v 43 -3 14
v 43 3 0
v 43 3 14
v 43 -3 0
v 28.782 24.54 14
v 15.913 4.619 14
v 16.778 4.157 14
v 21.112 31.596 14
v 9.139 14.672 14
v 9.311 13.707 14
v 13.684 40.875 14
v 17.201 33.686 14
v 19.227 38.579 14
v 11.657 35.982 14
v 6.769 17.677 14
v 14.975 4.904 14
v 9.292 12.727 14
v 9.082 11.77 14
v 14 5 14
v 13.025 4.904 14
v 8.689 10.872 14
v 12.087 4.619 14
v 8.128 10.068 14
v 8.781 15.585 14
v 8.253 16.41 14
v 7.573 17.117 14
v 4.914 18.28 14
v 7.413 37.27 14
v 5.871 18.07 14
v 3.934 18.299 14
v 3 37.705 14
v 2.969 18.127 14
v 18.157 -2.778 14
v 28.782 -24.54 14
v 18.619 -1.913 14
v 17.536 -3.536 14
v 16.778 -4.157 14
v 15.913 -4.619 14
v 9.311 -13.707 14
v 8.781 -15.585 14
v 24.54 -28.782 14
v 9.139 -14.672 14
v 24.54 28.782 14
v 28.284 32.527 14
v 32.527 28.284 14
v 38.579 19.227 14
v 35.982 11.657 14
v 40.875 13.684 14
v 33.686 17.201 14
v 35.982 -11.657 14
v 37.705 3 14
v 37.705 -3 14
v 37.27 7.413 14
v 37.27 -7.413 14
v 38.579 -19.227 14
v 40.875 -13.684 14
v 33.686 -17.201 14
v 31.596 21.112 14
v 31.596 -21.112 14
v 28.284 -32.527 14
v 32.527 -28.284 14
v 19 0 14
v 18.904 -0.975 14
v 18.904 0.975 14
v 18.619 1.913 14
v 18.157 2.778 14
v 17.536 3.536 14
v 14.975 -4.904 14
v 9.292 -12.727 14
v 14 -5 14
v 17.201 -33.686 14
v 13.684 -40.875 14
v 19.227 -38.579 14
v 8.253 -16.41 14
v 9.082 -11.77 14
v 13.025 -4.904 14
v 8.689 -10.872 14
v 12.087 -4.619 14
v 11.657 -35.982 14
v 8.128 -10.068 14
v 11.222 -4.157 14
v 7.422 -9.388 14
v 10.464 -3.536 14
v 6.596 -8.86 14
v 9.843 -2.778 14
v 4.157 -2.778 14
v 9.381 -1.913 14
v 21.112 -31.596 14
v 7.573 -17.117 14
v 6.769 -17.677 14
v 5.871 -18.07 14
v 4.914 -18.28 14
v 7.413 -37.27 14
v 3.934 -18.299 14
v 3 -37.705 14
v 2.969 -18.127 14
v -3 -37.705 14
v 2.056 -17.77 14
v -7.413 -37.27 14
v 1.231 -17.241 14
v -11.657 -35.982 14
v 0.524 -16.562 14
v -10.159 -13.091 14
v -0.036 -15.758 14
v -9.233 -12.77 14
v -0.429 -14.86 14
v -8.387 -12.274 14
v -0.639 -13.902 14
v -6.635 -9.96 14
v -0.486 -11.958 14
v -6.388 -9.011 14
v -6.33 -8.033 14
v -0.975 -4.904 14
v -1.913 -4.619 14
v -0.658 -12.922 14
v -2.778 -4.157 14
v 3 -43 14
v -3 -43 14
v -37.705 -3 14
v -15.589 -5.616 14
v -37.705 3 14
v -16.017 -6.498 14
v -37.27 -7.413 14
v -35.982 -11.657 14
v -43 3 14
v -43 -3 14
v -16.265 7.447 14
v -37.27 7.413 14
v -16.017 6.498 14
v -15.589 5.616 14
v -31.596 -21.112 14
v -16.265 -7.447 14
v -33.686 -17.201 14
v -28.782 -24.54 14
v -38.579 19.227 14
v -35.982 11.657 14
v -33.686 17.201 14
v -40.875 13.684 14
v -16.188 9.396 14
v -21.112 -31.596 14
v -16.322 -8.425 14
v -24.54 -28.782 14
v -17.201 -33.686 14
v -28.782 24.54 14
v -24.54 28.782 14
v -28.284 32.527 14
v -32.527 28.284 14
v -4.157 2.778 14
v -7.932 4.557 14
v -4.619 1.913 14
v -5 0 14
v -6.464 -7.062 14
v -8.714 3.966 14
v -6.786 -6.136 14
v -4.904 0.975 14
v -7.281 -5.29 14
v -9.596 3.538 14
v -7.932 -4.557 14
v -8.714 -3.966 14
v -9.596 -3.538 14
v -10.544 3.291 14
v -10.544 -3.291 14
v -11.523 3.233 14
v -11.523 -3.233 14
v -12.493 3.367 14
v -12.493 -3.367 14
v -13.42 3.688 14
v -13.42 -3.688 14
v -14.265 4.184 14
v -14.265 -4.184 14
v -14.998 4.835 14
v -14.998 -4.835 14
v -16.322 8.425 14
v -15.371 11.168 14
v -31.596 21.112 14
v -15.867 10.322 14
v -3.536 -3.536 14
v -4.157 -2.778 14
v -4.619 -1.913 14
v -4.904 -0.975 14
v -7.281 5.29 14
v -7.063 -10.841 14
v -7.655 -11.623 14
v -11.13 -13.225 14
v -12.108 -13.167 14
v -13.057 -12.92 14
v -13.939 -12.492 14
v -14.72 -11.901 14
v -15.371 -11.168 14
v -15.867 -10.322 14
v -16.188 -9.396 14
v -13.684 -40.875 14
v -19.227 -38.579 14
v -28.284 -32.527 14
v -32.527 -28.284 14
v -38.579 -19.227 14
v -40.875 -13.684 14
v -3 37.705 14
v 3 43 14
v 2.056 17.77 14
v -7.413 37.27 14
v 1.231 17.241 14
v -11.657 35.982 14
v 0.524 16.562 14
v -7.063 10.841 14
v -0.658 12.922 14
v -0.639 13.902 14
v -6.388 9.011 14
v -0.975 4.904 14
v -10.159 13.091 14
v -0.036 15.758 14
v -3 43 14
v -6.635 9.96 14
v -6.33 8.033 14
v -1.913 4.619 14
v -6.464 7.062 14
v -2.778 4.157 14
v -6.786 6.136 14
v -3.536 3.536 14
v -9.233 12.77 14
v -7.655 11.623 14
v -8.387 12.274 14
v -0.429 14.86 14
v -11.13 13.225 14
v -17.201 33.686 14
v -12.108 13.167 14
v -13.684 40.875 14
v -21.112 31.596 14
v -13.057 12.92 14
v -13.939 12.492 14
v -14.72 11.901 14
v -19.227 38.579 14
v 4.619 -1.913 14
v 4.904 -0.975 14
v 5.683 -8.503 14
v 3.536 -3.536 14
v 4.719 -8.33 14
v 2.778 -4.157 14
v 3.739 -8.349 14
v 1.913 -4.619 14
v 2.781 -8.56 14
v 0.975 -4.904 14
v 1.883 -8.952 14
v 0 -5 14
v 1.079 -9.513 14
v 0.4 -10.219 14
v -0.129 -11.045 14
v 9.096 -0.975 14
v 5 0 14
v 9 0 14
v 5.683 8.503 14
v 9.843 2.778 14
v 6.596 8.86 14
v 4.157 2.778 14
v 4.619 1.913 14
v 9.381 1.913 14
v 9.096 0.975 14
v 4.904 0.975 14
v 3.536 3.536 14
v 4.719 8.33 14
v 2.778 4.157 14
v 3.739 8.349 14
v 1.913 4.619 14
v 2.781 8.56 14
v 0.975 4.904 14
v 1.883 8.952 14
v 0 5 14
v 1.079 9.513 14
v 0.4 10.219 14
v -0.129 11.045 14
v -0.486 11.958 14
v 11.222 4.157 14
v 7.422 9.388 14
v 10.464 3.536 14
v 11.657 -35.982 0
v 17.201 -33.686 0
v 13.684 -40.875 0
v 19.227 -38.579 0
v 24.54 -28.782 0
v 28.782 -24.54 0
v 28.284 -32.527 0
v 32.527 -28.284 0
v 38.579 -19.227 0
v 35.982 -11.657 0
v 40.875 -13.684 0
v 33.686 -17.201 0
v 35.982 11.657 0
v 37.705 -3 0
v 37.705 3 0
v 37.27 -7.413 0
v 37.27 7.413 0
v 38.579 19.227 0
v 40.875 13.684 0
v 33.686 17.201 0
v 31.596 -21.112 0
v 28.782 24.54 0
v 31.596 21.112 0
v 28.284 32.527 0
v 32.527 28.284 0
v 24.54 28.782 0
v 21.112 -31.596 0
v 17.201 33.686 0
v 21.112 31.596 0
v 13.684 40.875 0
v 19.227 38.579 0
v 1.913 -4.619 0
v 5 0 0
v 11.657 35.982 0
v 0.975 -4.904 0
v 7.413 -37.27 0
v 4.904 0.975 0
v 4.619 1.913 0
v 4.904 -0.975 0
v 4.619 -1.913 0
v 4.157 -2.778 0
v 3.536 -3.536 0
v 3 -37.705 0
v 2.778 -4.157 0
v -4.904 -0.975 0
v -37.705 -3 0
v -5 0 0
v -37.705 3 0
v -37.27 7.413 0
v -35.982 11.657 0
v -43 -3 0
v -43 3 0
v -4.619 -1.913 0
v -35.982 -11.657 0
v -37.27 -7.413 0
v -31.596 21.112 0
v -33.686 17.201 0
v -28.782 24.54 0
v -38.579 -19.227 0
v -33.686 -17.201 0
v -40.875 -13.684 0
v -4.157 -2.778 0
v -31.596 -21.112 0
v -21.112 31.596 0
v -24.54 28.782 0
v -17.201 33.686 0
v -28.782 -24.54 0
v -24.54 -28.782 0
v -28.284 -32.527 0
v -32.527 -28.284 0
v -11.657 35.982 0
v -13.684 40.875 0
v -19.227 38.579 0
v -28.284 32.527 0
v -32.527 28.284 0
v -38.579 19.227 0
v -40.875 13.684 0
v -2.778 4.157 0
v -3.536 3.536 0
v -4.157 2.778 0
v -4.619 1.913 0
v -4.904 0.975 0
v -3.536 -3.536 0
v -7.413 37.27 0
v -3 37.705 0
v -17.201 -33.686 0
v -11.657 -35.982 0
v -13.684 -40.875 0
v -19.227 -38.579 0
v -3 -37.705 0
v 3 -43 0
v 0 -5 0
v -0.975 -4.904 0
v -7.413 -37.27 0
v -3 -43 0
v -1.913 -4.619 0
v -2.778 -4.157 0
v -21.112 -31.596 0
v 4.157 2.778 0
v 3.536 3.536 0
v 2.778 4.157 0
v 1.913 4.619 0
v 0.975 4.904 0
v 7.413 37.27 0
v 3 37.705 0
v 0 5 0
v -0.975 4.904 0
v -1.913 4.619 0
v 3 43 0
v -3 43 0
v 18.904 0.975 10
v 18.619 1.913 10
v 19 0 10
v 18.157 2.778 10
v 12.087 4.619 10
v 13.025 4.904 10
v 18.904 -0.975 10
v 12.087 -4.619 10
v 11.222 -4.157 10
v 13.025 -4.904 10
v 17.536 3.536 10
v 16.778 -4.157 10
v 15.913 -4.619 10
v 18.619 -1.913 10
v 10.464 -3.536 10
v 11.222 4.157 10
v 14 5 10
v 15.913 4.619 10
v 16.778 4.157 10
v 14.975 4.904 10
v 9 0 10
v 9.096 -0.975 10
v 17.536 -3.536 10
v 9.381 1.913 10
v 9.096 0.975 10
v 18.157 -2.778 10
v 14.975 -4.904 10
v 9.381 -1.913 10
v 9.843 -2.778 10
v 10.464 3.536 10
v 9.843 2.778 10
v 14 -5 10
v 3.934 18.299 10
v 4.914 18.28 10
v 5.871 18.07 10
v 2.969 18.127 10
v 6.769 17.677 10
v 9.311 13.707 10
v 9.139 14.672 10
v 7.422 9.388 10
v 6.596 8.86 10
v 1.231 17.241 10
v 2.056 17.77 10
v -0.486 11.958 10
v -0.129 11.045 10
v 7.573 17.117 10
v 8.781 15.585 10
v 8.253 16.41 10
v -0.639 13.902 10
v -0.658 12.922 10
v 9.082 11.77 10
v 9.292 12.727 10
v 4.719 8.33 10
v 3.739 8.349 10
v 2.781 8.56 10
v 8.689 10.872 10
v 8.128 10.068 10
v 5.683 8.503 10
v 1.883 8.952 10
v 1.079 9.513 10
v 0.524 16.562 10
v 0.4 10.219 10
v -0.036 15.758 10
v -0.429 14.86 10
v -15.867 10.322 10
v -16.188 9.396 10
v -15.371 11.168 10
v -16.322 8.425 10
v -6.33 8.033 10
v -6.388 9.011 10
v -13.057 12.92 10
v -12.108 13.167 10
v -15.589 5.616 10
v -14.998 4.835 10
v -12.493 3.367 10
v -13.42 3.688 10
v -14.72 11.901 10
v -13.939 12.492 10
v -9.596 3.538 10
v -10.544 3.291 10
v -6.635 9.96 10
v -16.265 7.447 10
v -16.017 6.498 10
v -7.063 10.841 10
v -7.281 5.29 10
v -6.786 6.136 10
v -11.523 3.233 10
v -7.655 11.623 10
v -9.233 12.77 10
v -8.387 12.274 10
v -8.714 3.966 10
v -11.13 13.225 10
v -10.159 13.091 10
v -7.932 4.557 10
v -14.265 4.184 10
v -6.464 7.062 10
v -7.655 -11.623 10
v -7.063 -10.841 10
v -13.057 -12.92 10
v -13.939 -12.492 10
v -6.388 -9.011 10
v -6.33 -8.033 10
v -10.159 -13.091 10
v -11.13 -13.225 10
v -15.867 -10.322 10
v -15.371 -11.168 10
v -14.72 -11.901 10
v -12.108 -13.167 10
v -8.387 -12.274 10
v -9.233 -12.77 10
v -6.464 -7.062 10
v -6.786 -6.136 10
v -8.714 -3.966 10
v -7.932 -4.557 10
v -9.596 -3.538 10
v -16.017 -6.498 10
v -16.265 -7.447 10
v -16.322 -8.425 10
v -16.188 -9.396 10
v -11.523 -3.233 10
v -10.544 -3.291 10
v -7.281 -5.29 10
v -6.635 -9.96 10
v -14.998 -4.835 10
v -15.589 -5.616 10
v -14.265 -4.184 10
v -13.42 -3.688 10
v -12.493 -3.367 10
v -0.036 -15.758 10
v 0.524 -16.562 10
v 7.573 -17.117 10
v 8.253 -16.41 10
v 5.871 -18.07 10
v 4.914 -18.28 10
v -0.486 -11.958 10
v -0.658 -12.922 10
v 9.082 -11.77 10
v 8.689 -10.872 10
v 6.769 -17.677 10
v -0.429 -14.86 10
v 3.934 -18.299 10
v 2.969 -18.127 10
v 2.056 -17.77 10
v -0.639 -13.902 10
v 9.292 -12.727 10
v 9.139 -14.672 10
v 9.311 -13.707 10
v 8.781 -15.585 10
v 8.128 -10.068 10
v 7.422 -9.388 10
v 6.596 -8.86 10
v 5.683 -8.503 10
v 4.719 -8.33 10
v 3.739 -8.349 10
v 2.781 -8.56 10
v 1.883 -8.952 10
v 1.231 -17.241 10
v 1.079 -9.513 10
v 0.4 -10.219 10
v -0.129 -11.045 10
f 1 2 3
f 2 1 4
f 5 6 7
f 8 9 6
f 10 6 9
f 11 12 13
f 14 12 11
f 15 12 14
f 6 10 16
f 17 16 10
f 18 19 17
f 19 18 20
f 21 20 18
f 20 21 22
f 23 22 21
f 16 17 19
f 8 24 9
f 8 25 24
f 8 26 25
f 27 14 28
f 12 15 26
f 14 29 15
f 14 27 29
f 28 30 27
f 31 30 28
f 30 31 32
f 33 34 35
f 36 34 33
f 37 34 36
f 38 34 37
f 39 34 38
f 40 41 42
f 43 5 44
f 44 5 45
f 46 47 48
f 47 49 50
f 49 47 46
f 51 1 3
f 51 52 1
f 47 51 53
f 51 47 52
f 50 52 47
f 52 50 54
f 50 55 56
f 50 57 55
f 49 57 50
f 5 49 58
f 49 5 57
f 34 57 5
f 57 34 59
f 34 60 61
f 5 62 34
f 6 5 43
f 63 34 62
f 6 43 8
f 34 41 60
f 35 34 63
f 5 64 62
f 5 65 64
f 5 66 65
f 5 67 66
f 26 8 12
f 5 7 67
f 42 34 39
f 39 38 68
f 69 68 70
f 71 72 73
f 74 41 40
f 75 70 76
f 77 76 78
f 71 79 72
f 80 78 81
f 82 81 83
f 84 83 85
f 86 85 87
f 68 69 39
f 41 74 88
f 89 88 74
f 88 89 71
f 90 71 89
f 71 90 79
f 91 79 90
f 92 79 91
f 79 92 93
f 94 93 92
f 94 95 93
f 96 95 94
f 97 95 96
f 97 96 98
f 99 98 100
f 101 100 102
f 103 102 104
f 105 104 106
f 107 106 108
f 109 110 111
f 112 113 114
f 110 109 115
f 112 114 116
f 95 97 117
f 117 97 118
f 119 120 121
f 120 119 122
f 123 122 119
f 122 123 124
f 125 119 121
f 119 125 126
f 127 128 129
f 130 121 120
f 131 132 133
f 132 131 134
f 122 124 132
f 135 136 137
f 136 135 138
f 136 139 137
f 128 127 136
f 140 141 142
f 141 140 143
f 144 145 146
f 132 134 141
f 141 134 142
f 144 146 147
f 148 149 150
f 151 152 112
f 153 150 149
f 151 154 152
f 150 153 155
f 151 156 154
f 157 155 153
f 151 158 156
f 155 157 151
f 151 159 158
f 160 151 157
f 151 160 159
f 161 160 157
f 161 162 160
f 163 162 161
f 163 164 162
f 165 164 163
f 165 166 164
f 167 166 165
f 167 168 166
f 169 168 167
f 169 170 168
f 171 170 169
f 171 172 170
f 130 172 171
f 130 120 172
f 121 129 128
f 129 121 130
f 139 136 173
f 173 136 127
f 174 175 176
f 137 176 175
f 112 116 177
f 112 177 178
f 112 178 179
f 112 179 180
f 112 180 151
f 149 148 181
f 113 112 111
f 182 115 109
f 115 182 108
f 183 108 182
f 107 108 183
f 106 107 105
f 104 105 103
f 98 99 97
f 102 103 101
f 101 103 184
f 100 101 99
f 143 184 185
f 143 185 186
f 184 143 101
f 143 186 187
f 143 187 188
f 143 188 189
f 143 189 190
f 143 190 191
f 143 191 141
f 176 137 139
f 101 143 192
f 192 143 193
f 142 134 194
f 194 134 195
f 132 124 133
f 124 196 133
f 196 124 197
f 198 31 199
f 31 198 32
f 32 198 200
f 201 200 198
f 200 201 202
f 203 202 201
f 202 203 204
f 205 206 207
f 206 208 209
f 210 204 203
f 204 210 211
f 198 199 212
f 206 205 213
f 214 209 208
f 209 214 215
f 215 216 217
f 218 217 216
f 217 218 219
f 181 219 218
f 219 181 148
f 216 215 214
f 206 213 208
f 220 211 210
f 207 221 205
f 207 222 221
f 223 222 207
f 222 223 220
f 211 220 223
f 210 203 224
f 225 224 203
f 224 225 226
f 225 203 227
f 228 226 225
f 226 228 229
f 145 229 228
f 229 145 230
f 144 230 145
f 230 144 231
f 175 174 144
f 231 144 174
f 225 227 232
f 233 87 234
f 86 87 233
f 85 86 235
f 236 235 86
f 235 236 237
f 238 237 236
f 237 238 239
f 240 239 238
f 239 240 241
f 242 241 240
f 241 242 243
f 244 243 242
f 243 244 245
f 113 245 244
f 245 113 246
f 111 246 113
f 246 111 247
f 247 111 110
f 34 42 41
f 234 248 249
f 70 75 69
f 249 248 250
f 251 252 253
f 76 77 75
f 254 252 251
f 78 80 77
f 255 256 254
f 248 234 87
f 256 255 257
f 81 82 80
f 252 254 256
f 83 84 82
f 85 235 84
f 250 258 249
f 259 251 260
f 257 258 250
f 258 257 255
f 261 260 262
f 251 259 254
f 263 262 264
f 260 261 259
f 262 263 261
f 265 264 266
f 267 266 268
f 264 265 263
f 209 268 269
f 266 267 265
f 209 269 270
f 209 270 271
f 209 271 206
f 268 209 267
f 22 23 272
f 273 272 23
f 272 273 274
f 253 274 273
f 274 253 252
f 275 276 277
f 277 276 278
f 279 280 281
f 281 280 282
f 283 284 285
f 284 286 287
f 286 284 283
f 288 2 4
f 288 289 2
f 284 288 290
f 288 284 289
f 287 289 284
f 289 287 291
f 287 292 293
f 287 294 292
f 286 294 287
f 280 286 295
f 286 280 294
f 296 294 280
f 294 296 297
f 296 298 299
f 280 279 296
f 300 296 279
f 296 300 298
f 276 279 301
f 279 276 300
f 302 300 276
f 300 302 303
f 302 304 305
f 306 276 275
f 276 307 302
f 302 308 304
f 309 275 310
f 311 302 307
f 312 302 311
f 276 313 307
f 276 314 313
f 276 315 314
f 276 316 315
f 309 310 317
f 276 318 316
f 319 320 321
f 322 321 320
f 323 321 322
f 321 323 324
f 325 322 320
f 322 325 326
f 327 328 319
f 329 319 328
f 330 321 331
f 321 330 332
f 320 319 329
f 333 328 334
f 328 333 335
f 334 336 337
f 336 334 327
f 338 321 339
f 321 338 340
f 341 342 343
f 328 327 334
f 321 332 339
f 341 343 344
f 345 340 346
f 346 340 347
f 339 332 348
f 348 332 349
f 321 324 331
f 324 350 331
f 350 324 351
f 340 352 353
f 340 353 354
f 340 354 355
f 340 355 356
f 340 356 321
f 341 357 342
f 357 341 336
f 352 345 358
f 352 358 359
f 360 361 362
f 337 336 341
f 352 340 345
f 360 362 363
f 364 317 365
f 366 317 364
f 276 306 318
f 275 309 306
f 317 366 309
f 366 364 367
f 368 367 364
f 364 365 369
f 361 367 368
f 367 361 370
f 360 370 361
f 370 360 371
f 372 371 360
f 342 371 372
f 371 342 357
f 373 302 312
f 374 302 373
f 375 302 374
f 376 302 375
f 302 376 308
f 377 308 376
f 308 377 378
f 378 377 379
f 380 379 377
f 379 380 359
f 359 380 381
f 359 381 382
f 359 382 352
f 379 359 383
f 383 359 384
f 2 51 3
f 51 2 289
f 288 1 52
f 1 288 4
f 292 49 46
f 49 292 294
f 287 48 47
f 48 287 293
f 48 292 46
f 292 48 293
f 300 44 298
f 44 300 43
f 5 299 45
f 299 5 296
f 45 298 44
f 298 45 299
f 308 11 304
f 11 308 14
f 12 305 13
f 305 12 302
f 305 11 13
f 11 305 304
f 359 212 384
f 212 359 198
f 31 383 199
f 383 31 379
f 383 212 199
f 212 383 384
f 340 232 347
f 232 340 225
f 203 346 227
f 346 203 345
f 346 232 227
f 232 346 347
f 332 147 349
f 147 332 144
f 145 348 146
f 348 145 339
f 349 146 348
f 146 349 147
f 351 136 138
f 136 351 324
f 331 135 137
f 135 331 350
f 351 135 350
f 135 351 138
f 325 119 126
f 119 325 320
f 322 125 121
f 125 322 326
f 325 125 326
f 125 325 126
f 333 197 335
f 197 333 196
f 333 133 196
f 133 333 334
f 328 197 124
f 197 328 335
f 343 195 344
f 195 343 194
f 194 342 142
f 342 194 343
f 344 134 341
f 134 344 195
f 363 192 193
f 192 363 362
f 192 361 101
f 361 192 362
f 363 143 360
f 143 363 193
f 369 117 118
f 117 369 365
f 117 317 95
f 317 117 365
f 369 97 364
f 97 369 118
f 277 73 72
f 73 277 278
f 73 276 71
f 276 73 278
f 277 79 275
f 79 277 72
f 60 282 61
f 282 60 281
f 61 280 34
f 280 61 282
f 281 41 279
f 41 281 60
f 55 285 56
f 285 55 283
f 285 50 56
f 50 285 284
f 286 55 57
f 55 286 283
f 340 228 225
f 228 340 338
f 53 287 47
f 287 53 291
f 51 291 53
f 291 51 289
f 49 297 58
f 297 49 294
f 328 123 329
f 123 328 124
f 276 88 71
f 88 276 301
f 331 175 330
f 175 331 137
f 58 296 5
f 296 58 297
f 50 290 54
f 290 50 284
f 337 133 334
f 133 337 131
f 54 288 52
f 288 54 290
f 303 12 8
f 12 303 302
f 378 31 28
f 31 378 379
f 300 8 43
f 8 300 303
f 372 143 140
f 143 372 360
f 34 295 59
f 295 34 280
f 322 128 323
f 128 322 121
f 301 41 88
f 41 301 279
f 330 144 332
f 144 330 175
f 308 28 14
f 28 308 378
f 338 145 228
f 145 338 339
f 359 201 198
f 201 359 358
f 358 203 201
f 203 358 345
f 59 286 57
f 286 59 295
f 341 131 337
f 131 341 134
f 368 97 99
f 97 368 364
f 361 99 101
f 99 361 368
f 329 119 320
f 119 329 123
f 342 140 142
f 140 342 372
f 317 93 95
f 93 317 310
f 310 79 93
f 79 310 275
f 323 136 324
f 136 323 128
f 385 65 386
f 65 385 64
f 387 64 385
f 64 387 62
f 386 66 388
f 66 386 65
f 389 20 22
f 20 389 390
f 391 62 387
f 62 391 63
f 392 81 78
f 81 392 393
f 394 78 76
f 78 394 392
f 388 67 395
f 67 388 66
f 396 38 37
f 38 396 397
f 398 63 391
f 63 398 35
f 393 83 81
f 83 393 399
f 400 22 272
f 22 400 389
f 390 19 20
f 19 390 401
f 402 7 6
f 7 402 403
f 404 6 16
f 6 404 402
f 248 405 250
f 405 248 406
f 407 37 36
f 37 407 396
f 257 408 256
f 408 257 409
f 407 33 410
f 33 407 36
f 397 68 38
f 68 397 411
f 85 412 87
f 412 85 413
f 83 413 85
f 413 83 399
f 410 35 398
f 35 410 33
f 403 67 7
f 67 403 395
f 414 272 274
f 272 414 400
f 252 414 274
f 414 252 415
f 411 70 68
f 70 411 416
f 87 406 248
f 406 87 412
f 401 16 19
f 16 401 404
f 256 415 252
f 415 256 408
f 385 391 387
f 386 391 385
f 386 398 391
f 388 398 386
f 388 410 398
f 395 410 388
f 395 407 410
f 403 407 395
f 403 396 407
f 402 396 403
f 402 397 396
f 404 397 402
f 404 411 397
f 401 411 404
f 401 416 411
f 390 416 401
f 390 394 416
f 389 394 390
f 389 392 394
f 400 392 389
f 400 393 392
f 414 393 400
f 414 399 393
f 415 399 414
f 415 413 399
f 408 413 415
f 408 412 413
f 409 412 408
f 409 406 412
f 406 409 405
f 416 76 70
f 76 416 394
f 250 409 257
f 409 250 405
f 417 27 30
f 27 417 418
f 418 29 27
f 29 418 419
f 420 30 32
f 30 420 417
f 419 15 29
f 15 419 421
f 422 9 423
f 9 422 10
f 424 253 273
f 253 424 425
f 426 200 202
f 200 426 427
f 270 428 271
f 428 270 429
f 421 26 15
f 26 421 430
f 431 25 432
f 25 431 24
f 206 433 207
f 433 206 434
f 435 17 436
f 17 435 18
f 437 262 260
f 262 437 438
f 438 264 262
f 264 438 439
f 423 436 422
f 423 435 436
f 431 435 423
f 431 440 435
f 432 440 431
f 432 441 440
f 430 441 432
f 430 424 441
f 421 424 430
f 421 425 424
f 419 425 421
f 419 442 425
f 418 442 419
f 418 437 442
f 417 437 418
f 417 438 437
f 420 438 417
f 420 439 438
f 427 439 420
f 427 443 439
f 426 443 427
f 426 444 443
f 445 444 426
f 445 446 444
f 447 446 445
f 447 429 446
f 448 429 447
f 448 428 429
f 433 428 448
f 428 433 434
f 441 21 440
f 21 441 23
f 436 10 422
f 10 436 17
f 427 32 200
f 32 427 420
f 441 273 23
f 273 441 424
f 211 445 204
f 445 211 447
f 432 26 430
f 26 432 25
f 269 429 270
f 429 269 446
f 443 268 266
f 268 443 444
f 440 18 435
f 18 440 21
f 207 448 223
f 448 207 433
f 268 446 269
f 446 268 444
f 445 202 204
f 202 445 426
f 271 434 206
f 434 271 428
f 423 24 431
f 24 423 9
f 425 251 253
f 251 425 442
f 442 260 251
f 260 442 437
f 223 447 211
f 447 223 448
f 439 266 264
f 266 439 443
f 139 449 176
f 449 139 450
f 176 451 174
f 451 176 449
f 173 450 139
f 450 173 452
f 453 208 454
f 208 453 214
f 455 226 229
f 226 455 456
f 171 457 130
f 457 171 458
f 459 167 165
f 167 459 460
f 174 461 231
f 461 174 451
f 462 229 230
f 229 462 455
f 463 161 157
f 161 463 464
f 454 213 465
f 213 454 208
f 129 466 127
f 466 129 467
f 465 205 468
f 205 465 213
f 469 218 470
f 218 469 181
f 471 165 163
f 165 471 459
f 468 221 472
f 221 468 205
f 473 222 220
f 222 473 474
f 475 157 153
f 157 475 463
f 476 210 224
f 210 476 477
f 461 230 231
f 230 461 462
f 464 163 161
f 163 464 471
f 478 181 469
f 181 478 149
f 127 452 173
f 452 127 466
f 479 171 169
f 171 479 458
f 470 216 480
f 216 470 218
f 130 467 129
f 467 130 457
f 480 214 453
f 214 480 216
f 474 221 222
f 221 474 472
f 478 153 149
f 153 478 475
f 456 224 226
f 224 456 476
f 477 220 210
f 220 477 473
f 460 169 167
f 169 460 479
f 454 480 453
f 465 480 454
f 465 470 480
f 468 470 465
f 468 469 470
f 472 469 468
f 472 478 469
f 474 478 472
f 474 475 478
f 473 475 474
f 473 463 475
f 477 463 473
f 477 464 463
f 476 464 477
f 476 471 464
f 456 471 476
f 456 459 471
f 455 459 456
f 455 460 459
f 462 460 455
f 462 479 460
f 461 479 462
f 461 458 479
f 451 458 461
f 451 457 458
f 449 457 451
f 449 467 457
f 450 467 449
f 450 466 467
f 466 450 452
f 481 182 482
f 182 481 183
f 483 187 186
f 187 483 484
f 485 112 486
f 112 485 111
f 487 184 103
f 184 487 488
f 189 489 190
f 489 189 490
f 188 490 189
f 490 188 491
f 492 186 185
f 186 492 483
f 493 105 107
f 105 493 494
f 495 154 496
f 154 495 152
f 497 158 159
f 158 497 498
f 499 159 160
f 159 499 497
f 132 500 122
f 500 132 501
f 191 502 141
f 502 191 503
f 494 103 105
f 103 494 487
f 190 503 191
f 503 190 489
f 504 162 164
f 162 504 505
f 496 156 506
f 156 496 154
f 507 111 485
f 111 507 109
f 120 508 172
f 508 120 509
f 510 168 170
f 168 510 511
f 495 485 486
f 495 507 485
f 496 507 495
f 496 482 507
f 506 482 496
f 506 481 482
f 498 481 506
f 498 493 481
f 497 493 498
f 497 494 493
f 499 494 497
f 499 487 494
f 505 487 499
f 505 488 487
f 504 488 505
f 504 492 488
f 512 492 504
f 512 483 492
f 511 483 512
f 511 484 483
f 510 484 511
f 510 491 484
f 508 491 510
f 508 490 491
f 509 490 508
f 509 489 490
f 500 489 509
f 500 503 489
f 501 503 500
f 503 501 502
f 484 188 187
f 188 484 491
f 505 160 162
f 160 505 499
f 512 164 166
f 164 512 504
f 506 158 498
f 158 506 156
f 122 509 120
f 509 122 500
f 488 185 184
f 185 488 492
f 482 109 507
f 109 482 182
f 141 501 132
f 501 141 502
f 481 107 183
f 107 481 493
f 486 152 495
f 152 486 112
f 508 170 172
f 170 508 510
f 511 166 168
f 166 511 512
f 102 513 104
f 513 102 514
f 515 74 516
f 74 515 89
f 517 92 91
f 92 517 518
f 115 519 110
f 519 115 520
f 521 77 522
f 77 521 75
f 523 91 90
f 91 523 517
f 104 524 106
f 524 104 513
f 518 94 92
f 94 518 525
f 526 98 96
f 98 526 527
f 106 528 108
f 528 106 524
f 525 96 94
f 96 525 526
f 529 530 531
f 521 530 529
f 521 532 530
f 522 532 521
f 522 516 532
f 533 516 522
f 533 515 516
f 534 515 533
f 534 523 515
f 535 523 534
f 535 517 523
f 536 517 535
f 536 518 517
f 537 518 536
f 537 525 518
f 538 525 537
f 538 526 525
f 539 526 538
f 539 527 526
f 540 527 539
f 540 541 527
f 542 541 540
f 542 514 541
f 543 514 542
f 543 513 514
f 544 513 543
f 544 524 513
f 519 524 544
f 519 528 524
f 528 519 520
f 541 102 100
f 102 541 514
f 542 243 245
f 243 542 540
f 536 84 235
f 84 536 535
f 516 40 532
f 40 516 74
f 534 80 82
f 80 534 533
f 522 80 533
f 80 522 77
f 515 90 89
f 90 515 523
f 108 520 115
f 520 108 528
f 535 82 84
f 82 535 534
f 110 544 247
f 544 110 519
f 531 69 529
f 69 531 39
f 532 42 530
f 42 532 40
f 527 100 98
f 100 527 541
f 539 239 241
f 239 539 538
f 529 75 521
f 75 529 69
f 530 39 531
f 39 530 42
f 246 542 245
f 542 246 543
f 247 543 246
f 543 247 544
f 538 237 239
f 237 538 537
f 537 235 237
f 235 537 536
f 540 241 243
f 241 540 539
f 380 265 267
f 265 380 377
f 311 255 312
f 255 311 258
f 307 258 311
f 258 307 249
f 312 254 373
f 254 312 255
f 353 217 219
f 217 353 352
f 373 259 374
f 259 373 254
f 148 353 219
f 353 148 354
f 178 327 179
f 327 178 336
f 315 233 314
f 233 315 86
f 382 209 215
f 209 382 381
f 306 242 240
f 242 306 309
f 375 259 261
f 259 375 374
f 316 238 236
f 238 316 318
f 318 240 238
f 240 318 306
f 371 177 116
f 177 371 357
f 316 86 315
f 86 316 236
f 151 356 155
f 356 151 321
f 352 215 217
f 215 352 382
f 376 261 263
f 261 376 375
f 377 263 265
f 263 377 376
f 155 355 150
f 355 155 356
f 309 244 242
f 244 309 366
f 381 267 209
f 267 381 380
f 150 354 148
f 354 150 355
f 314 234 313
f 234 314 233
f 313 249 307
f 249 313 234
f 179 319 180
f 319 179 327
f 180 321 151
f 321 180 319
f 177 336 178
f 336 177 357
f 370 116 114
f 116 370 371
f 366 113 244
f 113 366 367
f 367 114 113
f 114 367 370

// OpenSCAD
$fn = 32;

// ----------------------------------------------------------------------
// Spur blank: lightened gear blank
// ----------------------------------------------------------------------

// --- parameters (mm) ---
disc_r = 38;              // blank root radius
disc_t = 14;              // blank thickness
n_teeth = 16;             // stub tooth count
tooth_w = 6;              // tooth width at the root
tooth_h = 5;              // tooth height above the root
bore_r = 5;               // central bore radius
ring_r = 14;              // lightening pocket ring radius
pocket_r = 5;             // lightening pocket radius

out_r = disc_r + tooth_h;  // tip radius
bbox_x = 86.0;  // measured width over the teeth
bbox_y = 86.0;  // measured depth over the teeth

difference() {
union() {
  cylinder(r = disc_r, h = disc_t);
  for (i = [0 : n_teeth - 1])
    rotate([0, 0, i * 360 / n_teeth])
      translate([disc_r - 1, -tooth_w / 2, 0])
        cube([tooth_h + 1, tooth_w, disc_t]);
}
  translate([0, 0, -1]) cylinder(r = bore_r, h = disc_t + 2);
  for (i = [0 : 5])
    rotate([0, 0, i * 72])
      translate([ring_r, 0, disc_t - 4])
        cylinder(r = pocket_r, h = 5);
}
